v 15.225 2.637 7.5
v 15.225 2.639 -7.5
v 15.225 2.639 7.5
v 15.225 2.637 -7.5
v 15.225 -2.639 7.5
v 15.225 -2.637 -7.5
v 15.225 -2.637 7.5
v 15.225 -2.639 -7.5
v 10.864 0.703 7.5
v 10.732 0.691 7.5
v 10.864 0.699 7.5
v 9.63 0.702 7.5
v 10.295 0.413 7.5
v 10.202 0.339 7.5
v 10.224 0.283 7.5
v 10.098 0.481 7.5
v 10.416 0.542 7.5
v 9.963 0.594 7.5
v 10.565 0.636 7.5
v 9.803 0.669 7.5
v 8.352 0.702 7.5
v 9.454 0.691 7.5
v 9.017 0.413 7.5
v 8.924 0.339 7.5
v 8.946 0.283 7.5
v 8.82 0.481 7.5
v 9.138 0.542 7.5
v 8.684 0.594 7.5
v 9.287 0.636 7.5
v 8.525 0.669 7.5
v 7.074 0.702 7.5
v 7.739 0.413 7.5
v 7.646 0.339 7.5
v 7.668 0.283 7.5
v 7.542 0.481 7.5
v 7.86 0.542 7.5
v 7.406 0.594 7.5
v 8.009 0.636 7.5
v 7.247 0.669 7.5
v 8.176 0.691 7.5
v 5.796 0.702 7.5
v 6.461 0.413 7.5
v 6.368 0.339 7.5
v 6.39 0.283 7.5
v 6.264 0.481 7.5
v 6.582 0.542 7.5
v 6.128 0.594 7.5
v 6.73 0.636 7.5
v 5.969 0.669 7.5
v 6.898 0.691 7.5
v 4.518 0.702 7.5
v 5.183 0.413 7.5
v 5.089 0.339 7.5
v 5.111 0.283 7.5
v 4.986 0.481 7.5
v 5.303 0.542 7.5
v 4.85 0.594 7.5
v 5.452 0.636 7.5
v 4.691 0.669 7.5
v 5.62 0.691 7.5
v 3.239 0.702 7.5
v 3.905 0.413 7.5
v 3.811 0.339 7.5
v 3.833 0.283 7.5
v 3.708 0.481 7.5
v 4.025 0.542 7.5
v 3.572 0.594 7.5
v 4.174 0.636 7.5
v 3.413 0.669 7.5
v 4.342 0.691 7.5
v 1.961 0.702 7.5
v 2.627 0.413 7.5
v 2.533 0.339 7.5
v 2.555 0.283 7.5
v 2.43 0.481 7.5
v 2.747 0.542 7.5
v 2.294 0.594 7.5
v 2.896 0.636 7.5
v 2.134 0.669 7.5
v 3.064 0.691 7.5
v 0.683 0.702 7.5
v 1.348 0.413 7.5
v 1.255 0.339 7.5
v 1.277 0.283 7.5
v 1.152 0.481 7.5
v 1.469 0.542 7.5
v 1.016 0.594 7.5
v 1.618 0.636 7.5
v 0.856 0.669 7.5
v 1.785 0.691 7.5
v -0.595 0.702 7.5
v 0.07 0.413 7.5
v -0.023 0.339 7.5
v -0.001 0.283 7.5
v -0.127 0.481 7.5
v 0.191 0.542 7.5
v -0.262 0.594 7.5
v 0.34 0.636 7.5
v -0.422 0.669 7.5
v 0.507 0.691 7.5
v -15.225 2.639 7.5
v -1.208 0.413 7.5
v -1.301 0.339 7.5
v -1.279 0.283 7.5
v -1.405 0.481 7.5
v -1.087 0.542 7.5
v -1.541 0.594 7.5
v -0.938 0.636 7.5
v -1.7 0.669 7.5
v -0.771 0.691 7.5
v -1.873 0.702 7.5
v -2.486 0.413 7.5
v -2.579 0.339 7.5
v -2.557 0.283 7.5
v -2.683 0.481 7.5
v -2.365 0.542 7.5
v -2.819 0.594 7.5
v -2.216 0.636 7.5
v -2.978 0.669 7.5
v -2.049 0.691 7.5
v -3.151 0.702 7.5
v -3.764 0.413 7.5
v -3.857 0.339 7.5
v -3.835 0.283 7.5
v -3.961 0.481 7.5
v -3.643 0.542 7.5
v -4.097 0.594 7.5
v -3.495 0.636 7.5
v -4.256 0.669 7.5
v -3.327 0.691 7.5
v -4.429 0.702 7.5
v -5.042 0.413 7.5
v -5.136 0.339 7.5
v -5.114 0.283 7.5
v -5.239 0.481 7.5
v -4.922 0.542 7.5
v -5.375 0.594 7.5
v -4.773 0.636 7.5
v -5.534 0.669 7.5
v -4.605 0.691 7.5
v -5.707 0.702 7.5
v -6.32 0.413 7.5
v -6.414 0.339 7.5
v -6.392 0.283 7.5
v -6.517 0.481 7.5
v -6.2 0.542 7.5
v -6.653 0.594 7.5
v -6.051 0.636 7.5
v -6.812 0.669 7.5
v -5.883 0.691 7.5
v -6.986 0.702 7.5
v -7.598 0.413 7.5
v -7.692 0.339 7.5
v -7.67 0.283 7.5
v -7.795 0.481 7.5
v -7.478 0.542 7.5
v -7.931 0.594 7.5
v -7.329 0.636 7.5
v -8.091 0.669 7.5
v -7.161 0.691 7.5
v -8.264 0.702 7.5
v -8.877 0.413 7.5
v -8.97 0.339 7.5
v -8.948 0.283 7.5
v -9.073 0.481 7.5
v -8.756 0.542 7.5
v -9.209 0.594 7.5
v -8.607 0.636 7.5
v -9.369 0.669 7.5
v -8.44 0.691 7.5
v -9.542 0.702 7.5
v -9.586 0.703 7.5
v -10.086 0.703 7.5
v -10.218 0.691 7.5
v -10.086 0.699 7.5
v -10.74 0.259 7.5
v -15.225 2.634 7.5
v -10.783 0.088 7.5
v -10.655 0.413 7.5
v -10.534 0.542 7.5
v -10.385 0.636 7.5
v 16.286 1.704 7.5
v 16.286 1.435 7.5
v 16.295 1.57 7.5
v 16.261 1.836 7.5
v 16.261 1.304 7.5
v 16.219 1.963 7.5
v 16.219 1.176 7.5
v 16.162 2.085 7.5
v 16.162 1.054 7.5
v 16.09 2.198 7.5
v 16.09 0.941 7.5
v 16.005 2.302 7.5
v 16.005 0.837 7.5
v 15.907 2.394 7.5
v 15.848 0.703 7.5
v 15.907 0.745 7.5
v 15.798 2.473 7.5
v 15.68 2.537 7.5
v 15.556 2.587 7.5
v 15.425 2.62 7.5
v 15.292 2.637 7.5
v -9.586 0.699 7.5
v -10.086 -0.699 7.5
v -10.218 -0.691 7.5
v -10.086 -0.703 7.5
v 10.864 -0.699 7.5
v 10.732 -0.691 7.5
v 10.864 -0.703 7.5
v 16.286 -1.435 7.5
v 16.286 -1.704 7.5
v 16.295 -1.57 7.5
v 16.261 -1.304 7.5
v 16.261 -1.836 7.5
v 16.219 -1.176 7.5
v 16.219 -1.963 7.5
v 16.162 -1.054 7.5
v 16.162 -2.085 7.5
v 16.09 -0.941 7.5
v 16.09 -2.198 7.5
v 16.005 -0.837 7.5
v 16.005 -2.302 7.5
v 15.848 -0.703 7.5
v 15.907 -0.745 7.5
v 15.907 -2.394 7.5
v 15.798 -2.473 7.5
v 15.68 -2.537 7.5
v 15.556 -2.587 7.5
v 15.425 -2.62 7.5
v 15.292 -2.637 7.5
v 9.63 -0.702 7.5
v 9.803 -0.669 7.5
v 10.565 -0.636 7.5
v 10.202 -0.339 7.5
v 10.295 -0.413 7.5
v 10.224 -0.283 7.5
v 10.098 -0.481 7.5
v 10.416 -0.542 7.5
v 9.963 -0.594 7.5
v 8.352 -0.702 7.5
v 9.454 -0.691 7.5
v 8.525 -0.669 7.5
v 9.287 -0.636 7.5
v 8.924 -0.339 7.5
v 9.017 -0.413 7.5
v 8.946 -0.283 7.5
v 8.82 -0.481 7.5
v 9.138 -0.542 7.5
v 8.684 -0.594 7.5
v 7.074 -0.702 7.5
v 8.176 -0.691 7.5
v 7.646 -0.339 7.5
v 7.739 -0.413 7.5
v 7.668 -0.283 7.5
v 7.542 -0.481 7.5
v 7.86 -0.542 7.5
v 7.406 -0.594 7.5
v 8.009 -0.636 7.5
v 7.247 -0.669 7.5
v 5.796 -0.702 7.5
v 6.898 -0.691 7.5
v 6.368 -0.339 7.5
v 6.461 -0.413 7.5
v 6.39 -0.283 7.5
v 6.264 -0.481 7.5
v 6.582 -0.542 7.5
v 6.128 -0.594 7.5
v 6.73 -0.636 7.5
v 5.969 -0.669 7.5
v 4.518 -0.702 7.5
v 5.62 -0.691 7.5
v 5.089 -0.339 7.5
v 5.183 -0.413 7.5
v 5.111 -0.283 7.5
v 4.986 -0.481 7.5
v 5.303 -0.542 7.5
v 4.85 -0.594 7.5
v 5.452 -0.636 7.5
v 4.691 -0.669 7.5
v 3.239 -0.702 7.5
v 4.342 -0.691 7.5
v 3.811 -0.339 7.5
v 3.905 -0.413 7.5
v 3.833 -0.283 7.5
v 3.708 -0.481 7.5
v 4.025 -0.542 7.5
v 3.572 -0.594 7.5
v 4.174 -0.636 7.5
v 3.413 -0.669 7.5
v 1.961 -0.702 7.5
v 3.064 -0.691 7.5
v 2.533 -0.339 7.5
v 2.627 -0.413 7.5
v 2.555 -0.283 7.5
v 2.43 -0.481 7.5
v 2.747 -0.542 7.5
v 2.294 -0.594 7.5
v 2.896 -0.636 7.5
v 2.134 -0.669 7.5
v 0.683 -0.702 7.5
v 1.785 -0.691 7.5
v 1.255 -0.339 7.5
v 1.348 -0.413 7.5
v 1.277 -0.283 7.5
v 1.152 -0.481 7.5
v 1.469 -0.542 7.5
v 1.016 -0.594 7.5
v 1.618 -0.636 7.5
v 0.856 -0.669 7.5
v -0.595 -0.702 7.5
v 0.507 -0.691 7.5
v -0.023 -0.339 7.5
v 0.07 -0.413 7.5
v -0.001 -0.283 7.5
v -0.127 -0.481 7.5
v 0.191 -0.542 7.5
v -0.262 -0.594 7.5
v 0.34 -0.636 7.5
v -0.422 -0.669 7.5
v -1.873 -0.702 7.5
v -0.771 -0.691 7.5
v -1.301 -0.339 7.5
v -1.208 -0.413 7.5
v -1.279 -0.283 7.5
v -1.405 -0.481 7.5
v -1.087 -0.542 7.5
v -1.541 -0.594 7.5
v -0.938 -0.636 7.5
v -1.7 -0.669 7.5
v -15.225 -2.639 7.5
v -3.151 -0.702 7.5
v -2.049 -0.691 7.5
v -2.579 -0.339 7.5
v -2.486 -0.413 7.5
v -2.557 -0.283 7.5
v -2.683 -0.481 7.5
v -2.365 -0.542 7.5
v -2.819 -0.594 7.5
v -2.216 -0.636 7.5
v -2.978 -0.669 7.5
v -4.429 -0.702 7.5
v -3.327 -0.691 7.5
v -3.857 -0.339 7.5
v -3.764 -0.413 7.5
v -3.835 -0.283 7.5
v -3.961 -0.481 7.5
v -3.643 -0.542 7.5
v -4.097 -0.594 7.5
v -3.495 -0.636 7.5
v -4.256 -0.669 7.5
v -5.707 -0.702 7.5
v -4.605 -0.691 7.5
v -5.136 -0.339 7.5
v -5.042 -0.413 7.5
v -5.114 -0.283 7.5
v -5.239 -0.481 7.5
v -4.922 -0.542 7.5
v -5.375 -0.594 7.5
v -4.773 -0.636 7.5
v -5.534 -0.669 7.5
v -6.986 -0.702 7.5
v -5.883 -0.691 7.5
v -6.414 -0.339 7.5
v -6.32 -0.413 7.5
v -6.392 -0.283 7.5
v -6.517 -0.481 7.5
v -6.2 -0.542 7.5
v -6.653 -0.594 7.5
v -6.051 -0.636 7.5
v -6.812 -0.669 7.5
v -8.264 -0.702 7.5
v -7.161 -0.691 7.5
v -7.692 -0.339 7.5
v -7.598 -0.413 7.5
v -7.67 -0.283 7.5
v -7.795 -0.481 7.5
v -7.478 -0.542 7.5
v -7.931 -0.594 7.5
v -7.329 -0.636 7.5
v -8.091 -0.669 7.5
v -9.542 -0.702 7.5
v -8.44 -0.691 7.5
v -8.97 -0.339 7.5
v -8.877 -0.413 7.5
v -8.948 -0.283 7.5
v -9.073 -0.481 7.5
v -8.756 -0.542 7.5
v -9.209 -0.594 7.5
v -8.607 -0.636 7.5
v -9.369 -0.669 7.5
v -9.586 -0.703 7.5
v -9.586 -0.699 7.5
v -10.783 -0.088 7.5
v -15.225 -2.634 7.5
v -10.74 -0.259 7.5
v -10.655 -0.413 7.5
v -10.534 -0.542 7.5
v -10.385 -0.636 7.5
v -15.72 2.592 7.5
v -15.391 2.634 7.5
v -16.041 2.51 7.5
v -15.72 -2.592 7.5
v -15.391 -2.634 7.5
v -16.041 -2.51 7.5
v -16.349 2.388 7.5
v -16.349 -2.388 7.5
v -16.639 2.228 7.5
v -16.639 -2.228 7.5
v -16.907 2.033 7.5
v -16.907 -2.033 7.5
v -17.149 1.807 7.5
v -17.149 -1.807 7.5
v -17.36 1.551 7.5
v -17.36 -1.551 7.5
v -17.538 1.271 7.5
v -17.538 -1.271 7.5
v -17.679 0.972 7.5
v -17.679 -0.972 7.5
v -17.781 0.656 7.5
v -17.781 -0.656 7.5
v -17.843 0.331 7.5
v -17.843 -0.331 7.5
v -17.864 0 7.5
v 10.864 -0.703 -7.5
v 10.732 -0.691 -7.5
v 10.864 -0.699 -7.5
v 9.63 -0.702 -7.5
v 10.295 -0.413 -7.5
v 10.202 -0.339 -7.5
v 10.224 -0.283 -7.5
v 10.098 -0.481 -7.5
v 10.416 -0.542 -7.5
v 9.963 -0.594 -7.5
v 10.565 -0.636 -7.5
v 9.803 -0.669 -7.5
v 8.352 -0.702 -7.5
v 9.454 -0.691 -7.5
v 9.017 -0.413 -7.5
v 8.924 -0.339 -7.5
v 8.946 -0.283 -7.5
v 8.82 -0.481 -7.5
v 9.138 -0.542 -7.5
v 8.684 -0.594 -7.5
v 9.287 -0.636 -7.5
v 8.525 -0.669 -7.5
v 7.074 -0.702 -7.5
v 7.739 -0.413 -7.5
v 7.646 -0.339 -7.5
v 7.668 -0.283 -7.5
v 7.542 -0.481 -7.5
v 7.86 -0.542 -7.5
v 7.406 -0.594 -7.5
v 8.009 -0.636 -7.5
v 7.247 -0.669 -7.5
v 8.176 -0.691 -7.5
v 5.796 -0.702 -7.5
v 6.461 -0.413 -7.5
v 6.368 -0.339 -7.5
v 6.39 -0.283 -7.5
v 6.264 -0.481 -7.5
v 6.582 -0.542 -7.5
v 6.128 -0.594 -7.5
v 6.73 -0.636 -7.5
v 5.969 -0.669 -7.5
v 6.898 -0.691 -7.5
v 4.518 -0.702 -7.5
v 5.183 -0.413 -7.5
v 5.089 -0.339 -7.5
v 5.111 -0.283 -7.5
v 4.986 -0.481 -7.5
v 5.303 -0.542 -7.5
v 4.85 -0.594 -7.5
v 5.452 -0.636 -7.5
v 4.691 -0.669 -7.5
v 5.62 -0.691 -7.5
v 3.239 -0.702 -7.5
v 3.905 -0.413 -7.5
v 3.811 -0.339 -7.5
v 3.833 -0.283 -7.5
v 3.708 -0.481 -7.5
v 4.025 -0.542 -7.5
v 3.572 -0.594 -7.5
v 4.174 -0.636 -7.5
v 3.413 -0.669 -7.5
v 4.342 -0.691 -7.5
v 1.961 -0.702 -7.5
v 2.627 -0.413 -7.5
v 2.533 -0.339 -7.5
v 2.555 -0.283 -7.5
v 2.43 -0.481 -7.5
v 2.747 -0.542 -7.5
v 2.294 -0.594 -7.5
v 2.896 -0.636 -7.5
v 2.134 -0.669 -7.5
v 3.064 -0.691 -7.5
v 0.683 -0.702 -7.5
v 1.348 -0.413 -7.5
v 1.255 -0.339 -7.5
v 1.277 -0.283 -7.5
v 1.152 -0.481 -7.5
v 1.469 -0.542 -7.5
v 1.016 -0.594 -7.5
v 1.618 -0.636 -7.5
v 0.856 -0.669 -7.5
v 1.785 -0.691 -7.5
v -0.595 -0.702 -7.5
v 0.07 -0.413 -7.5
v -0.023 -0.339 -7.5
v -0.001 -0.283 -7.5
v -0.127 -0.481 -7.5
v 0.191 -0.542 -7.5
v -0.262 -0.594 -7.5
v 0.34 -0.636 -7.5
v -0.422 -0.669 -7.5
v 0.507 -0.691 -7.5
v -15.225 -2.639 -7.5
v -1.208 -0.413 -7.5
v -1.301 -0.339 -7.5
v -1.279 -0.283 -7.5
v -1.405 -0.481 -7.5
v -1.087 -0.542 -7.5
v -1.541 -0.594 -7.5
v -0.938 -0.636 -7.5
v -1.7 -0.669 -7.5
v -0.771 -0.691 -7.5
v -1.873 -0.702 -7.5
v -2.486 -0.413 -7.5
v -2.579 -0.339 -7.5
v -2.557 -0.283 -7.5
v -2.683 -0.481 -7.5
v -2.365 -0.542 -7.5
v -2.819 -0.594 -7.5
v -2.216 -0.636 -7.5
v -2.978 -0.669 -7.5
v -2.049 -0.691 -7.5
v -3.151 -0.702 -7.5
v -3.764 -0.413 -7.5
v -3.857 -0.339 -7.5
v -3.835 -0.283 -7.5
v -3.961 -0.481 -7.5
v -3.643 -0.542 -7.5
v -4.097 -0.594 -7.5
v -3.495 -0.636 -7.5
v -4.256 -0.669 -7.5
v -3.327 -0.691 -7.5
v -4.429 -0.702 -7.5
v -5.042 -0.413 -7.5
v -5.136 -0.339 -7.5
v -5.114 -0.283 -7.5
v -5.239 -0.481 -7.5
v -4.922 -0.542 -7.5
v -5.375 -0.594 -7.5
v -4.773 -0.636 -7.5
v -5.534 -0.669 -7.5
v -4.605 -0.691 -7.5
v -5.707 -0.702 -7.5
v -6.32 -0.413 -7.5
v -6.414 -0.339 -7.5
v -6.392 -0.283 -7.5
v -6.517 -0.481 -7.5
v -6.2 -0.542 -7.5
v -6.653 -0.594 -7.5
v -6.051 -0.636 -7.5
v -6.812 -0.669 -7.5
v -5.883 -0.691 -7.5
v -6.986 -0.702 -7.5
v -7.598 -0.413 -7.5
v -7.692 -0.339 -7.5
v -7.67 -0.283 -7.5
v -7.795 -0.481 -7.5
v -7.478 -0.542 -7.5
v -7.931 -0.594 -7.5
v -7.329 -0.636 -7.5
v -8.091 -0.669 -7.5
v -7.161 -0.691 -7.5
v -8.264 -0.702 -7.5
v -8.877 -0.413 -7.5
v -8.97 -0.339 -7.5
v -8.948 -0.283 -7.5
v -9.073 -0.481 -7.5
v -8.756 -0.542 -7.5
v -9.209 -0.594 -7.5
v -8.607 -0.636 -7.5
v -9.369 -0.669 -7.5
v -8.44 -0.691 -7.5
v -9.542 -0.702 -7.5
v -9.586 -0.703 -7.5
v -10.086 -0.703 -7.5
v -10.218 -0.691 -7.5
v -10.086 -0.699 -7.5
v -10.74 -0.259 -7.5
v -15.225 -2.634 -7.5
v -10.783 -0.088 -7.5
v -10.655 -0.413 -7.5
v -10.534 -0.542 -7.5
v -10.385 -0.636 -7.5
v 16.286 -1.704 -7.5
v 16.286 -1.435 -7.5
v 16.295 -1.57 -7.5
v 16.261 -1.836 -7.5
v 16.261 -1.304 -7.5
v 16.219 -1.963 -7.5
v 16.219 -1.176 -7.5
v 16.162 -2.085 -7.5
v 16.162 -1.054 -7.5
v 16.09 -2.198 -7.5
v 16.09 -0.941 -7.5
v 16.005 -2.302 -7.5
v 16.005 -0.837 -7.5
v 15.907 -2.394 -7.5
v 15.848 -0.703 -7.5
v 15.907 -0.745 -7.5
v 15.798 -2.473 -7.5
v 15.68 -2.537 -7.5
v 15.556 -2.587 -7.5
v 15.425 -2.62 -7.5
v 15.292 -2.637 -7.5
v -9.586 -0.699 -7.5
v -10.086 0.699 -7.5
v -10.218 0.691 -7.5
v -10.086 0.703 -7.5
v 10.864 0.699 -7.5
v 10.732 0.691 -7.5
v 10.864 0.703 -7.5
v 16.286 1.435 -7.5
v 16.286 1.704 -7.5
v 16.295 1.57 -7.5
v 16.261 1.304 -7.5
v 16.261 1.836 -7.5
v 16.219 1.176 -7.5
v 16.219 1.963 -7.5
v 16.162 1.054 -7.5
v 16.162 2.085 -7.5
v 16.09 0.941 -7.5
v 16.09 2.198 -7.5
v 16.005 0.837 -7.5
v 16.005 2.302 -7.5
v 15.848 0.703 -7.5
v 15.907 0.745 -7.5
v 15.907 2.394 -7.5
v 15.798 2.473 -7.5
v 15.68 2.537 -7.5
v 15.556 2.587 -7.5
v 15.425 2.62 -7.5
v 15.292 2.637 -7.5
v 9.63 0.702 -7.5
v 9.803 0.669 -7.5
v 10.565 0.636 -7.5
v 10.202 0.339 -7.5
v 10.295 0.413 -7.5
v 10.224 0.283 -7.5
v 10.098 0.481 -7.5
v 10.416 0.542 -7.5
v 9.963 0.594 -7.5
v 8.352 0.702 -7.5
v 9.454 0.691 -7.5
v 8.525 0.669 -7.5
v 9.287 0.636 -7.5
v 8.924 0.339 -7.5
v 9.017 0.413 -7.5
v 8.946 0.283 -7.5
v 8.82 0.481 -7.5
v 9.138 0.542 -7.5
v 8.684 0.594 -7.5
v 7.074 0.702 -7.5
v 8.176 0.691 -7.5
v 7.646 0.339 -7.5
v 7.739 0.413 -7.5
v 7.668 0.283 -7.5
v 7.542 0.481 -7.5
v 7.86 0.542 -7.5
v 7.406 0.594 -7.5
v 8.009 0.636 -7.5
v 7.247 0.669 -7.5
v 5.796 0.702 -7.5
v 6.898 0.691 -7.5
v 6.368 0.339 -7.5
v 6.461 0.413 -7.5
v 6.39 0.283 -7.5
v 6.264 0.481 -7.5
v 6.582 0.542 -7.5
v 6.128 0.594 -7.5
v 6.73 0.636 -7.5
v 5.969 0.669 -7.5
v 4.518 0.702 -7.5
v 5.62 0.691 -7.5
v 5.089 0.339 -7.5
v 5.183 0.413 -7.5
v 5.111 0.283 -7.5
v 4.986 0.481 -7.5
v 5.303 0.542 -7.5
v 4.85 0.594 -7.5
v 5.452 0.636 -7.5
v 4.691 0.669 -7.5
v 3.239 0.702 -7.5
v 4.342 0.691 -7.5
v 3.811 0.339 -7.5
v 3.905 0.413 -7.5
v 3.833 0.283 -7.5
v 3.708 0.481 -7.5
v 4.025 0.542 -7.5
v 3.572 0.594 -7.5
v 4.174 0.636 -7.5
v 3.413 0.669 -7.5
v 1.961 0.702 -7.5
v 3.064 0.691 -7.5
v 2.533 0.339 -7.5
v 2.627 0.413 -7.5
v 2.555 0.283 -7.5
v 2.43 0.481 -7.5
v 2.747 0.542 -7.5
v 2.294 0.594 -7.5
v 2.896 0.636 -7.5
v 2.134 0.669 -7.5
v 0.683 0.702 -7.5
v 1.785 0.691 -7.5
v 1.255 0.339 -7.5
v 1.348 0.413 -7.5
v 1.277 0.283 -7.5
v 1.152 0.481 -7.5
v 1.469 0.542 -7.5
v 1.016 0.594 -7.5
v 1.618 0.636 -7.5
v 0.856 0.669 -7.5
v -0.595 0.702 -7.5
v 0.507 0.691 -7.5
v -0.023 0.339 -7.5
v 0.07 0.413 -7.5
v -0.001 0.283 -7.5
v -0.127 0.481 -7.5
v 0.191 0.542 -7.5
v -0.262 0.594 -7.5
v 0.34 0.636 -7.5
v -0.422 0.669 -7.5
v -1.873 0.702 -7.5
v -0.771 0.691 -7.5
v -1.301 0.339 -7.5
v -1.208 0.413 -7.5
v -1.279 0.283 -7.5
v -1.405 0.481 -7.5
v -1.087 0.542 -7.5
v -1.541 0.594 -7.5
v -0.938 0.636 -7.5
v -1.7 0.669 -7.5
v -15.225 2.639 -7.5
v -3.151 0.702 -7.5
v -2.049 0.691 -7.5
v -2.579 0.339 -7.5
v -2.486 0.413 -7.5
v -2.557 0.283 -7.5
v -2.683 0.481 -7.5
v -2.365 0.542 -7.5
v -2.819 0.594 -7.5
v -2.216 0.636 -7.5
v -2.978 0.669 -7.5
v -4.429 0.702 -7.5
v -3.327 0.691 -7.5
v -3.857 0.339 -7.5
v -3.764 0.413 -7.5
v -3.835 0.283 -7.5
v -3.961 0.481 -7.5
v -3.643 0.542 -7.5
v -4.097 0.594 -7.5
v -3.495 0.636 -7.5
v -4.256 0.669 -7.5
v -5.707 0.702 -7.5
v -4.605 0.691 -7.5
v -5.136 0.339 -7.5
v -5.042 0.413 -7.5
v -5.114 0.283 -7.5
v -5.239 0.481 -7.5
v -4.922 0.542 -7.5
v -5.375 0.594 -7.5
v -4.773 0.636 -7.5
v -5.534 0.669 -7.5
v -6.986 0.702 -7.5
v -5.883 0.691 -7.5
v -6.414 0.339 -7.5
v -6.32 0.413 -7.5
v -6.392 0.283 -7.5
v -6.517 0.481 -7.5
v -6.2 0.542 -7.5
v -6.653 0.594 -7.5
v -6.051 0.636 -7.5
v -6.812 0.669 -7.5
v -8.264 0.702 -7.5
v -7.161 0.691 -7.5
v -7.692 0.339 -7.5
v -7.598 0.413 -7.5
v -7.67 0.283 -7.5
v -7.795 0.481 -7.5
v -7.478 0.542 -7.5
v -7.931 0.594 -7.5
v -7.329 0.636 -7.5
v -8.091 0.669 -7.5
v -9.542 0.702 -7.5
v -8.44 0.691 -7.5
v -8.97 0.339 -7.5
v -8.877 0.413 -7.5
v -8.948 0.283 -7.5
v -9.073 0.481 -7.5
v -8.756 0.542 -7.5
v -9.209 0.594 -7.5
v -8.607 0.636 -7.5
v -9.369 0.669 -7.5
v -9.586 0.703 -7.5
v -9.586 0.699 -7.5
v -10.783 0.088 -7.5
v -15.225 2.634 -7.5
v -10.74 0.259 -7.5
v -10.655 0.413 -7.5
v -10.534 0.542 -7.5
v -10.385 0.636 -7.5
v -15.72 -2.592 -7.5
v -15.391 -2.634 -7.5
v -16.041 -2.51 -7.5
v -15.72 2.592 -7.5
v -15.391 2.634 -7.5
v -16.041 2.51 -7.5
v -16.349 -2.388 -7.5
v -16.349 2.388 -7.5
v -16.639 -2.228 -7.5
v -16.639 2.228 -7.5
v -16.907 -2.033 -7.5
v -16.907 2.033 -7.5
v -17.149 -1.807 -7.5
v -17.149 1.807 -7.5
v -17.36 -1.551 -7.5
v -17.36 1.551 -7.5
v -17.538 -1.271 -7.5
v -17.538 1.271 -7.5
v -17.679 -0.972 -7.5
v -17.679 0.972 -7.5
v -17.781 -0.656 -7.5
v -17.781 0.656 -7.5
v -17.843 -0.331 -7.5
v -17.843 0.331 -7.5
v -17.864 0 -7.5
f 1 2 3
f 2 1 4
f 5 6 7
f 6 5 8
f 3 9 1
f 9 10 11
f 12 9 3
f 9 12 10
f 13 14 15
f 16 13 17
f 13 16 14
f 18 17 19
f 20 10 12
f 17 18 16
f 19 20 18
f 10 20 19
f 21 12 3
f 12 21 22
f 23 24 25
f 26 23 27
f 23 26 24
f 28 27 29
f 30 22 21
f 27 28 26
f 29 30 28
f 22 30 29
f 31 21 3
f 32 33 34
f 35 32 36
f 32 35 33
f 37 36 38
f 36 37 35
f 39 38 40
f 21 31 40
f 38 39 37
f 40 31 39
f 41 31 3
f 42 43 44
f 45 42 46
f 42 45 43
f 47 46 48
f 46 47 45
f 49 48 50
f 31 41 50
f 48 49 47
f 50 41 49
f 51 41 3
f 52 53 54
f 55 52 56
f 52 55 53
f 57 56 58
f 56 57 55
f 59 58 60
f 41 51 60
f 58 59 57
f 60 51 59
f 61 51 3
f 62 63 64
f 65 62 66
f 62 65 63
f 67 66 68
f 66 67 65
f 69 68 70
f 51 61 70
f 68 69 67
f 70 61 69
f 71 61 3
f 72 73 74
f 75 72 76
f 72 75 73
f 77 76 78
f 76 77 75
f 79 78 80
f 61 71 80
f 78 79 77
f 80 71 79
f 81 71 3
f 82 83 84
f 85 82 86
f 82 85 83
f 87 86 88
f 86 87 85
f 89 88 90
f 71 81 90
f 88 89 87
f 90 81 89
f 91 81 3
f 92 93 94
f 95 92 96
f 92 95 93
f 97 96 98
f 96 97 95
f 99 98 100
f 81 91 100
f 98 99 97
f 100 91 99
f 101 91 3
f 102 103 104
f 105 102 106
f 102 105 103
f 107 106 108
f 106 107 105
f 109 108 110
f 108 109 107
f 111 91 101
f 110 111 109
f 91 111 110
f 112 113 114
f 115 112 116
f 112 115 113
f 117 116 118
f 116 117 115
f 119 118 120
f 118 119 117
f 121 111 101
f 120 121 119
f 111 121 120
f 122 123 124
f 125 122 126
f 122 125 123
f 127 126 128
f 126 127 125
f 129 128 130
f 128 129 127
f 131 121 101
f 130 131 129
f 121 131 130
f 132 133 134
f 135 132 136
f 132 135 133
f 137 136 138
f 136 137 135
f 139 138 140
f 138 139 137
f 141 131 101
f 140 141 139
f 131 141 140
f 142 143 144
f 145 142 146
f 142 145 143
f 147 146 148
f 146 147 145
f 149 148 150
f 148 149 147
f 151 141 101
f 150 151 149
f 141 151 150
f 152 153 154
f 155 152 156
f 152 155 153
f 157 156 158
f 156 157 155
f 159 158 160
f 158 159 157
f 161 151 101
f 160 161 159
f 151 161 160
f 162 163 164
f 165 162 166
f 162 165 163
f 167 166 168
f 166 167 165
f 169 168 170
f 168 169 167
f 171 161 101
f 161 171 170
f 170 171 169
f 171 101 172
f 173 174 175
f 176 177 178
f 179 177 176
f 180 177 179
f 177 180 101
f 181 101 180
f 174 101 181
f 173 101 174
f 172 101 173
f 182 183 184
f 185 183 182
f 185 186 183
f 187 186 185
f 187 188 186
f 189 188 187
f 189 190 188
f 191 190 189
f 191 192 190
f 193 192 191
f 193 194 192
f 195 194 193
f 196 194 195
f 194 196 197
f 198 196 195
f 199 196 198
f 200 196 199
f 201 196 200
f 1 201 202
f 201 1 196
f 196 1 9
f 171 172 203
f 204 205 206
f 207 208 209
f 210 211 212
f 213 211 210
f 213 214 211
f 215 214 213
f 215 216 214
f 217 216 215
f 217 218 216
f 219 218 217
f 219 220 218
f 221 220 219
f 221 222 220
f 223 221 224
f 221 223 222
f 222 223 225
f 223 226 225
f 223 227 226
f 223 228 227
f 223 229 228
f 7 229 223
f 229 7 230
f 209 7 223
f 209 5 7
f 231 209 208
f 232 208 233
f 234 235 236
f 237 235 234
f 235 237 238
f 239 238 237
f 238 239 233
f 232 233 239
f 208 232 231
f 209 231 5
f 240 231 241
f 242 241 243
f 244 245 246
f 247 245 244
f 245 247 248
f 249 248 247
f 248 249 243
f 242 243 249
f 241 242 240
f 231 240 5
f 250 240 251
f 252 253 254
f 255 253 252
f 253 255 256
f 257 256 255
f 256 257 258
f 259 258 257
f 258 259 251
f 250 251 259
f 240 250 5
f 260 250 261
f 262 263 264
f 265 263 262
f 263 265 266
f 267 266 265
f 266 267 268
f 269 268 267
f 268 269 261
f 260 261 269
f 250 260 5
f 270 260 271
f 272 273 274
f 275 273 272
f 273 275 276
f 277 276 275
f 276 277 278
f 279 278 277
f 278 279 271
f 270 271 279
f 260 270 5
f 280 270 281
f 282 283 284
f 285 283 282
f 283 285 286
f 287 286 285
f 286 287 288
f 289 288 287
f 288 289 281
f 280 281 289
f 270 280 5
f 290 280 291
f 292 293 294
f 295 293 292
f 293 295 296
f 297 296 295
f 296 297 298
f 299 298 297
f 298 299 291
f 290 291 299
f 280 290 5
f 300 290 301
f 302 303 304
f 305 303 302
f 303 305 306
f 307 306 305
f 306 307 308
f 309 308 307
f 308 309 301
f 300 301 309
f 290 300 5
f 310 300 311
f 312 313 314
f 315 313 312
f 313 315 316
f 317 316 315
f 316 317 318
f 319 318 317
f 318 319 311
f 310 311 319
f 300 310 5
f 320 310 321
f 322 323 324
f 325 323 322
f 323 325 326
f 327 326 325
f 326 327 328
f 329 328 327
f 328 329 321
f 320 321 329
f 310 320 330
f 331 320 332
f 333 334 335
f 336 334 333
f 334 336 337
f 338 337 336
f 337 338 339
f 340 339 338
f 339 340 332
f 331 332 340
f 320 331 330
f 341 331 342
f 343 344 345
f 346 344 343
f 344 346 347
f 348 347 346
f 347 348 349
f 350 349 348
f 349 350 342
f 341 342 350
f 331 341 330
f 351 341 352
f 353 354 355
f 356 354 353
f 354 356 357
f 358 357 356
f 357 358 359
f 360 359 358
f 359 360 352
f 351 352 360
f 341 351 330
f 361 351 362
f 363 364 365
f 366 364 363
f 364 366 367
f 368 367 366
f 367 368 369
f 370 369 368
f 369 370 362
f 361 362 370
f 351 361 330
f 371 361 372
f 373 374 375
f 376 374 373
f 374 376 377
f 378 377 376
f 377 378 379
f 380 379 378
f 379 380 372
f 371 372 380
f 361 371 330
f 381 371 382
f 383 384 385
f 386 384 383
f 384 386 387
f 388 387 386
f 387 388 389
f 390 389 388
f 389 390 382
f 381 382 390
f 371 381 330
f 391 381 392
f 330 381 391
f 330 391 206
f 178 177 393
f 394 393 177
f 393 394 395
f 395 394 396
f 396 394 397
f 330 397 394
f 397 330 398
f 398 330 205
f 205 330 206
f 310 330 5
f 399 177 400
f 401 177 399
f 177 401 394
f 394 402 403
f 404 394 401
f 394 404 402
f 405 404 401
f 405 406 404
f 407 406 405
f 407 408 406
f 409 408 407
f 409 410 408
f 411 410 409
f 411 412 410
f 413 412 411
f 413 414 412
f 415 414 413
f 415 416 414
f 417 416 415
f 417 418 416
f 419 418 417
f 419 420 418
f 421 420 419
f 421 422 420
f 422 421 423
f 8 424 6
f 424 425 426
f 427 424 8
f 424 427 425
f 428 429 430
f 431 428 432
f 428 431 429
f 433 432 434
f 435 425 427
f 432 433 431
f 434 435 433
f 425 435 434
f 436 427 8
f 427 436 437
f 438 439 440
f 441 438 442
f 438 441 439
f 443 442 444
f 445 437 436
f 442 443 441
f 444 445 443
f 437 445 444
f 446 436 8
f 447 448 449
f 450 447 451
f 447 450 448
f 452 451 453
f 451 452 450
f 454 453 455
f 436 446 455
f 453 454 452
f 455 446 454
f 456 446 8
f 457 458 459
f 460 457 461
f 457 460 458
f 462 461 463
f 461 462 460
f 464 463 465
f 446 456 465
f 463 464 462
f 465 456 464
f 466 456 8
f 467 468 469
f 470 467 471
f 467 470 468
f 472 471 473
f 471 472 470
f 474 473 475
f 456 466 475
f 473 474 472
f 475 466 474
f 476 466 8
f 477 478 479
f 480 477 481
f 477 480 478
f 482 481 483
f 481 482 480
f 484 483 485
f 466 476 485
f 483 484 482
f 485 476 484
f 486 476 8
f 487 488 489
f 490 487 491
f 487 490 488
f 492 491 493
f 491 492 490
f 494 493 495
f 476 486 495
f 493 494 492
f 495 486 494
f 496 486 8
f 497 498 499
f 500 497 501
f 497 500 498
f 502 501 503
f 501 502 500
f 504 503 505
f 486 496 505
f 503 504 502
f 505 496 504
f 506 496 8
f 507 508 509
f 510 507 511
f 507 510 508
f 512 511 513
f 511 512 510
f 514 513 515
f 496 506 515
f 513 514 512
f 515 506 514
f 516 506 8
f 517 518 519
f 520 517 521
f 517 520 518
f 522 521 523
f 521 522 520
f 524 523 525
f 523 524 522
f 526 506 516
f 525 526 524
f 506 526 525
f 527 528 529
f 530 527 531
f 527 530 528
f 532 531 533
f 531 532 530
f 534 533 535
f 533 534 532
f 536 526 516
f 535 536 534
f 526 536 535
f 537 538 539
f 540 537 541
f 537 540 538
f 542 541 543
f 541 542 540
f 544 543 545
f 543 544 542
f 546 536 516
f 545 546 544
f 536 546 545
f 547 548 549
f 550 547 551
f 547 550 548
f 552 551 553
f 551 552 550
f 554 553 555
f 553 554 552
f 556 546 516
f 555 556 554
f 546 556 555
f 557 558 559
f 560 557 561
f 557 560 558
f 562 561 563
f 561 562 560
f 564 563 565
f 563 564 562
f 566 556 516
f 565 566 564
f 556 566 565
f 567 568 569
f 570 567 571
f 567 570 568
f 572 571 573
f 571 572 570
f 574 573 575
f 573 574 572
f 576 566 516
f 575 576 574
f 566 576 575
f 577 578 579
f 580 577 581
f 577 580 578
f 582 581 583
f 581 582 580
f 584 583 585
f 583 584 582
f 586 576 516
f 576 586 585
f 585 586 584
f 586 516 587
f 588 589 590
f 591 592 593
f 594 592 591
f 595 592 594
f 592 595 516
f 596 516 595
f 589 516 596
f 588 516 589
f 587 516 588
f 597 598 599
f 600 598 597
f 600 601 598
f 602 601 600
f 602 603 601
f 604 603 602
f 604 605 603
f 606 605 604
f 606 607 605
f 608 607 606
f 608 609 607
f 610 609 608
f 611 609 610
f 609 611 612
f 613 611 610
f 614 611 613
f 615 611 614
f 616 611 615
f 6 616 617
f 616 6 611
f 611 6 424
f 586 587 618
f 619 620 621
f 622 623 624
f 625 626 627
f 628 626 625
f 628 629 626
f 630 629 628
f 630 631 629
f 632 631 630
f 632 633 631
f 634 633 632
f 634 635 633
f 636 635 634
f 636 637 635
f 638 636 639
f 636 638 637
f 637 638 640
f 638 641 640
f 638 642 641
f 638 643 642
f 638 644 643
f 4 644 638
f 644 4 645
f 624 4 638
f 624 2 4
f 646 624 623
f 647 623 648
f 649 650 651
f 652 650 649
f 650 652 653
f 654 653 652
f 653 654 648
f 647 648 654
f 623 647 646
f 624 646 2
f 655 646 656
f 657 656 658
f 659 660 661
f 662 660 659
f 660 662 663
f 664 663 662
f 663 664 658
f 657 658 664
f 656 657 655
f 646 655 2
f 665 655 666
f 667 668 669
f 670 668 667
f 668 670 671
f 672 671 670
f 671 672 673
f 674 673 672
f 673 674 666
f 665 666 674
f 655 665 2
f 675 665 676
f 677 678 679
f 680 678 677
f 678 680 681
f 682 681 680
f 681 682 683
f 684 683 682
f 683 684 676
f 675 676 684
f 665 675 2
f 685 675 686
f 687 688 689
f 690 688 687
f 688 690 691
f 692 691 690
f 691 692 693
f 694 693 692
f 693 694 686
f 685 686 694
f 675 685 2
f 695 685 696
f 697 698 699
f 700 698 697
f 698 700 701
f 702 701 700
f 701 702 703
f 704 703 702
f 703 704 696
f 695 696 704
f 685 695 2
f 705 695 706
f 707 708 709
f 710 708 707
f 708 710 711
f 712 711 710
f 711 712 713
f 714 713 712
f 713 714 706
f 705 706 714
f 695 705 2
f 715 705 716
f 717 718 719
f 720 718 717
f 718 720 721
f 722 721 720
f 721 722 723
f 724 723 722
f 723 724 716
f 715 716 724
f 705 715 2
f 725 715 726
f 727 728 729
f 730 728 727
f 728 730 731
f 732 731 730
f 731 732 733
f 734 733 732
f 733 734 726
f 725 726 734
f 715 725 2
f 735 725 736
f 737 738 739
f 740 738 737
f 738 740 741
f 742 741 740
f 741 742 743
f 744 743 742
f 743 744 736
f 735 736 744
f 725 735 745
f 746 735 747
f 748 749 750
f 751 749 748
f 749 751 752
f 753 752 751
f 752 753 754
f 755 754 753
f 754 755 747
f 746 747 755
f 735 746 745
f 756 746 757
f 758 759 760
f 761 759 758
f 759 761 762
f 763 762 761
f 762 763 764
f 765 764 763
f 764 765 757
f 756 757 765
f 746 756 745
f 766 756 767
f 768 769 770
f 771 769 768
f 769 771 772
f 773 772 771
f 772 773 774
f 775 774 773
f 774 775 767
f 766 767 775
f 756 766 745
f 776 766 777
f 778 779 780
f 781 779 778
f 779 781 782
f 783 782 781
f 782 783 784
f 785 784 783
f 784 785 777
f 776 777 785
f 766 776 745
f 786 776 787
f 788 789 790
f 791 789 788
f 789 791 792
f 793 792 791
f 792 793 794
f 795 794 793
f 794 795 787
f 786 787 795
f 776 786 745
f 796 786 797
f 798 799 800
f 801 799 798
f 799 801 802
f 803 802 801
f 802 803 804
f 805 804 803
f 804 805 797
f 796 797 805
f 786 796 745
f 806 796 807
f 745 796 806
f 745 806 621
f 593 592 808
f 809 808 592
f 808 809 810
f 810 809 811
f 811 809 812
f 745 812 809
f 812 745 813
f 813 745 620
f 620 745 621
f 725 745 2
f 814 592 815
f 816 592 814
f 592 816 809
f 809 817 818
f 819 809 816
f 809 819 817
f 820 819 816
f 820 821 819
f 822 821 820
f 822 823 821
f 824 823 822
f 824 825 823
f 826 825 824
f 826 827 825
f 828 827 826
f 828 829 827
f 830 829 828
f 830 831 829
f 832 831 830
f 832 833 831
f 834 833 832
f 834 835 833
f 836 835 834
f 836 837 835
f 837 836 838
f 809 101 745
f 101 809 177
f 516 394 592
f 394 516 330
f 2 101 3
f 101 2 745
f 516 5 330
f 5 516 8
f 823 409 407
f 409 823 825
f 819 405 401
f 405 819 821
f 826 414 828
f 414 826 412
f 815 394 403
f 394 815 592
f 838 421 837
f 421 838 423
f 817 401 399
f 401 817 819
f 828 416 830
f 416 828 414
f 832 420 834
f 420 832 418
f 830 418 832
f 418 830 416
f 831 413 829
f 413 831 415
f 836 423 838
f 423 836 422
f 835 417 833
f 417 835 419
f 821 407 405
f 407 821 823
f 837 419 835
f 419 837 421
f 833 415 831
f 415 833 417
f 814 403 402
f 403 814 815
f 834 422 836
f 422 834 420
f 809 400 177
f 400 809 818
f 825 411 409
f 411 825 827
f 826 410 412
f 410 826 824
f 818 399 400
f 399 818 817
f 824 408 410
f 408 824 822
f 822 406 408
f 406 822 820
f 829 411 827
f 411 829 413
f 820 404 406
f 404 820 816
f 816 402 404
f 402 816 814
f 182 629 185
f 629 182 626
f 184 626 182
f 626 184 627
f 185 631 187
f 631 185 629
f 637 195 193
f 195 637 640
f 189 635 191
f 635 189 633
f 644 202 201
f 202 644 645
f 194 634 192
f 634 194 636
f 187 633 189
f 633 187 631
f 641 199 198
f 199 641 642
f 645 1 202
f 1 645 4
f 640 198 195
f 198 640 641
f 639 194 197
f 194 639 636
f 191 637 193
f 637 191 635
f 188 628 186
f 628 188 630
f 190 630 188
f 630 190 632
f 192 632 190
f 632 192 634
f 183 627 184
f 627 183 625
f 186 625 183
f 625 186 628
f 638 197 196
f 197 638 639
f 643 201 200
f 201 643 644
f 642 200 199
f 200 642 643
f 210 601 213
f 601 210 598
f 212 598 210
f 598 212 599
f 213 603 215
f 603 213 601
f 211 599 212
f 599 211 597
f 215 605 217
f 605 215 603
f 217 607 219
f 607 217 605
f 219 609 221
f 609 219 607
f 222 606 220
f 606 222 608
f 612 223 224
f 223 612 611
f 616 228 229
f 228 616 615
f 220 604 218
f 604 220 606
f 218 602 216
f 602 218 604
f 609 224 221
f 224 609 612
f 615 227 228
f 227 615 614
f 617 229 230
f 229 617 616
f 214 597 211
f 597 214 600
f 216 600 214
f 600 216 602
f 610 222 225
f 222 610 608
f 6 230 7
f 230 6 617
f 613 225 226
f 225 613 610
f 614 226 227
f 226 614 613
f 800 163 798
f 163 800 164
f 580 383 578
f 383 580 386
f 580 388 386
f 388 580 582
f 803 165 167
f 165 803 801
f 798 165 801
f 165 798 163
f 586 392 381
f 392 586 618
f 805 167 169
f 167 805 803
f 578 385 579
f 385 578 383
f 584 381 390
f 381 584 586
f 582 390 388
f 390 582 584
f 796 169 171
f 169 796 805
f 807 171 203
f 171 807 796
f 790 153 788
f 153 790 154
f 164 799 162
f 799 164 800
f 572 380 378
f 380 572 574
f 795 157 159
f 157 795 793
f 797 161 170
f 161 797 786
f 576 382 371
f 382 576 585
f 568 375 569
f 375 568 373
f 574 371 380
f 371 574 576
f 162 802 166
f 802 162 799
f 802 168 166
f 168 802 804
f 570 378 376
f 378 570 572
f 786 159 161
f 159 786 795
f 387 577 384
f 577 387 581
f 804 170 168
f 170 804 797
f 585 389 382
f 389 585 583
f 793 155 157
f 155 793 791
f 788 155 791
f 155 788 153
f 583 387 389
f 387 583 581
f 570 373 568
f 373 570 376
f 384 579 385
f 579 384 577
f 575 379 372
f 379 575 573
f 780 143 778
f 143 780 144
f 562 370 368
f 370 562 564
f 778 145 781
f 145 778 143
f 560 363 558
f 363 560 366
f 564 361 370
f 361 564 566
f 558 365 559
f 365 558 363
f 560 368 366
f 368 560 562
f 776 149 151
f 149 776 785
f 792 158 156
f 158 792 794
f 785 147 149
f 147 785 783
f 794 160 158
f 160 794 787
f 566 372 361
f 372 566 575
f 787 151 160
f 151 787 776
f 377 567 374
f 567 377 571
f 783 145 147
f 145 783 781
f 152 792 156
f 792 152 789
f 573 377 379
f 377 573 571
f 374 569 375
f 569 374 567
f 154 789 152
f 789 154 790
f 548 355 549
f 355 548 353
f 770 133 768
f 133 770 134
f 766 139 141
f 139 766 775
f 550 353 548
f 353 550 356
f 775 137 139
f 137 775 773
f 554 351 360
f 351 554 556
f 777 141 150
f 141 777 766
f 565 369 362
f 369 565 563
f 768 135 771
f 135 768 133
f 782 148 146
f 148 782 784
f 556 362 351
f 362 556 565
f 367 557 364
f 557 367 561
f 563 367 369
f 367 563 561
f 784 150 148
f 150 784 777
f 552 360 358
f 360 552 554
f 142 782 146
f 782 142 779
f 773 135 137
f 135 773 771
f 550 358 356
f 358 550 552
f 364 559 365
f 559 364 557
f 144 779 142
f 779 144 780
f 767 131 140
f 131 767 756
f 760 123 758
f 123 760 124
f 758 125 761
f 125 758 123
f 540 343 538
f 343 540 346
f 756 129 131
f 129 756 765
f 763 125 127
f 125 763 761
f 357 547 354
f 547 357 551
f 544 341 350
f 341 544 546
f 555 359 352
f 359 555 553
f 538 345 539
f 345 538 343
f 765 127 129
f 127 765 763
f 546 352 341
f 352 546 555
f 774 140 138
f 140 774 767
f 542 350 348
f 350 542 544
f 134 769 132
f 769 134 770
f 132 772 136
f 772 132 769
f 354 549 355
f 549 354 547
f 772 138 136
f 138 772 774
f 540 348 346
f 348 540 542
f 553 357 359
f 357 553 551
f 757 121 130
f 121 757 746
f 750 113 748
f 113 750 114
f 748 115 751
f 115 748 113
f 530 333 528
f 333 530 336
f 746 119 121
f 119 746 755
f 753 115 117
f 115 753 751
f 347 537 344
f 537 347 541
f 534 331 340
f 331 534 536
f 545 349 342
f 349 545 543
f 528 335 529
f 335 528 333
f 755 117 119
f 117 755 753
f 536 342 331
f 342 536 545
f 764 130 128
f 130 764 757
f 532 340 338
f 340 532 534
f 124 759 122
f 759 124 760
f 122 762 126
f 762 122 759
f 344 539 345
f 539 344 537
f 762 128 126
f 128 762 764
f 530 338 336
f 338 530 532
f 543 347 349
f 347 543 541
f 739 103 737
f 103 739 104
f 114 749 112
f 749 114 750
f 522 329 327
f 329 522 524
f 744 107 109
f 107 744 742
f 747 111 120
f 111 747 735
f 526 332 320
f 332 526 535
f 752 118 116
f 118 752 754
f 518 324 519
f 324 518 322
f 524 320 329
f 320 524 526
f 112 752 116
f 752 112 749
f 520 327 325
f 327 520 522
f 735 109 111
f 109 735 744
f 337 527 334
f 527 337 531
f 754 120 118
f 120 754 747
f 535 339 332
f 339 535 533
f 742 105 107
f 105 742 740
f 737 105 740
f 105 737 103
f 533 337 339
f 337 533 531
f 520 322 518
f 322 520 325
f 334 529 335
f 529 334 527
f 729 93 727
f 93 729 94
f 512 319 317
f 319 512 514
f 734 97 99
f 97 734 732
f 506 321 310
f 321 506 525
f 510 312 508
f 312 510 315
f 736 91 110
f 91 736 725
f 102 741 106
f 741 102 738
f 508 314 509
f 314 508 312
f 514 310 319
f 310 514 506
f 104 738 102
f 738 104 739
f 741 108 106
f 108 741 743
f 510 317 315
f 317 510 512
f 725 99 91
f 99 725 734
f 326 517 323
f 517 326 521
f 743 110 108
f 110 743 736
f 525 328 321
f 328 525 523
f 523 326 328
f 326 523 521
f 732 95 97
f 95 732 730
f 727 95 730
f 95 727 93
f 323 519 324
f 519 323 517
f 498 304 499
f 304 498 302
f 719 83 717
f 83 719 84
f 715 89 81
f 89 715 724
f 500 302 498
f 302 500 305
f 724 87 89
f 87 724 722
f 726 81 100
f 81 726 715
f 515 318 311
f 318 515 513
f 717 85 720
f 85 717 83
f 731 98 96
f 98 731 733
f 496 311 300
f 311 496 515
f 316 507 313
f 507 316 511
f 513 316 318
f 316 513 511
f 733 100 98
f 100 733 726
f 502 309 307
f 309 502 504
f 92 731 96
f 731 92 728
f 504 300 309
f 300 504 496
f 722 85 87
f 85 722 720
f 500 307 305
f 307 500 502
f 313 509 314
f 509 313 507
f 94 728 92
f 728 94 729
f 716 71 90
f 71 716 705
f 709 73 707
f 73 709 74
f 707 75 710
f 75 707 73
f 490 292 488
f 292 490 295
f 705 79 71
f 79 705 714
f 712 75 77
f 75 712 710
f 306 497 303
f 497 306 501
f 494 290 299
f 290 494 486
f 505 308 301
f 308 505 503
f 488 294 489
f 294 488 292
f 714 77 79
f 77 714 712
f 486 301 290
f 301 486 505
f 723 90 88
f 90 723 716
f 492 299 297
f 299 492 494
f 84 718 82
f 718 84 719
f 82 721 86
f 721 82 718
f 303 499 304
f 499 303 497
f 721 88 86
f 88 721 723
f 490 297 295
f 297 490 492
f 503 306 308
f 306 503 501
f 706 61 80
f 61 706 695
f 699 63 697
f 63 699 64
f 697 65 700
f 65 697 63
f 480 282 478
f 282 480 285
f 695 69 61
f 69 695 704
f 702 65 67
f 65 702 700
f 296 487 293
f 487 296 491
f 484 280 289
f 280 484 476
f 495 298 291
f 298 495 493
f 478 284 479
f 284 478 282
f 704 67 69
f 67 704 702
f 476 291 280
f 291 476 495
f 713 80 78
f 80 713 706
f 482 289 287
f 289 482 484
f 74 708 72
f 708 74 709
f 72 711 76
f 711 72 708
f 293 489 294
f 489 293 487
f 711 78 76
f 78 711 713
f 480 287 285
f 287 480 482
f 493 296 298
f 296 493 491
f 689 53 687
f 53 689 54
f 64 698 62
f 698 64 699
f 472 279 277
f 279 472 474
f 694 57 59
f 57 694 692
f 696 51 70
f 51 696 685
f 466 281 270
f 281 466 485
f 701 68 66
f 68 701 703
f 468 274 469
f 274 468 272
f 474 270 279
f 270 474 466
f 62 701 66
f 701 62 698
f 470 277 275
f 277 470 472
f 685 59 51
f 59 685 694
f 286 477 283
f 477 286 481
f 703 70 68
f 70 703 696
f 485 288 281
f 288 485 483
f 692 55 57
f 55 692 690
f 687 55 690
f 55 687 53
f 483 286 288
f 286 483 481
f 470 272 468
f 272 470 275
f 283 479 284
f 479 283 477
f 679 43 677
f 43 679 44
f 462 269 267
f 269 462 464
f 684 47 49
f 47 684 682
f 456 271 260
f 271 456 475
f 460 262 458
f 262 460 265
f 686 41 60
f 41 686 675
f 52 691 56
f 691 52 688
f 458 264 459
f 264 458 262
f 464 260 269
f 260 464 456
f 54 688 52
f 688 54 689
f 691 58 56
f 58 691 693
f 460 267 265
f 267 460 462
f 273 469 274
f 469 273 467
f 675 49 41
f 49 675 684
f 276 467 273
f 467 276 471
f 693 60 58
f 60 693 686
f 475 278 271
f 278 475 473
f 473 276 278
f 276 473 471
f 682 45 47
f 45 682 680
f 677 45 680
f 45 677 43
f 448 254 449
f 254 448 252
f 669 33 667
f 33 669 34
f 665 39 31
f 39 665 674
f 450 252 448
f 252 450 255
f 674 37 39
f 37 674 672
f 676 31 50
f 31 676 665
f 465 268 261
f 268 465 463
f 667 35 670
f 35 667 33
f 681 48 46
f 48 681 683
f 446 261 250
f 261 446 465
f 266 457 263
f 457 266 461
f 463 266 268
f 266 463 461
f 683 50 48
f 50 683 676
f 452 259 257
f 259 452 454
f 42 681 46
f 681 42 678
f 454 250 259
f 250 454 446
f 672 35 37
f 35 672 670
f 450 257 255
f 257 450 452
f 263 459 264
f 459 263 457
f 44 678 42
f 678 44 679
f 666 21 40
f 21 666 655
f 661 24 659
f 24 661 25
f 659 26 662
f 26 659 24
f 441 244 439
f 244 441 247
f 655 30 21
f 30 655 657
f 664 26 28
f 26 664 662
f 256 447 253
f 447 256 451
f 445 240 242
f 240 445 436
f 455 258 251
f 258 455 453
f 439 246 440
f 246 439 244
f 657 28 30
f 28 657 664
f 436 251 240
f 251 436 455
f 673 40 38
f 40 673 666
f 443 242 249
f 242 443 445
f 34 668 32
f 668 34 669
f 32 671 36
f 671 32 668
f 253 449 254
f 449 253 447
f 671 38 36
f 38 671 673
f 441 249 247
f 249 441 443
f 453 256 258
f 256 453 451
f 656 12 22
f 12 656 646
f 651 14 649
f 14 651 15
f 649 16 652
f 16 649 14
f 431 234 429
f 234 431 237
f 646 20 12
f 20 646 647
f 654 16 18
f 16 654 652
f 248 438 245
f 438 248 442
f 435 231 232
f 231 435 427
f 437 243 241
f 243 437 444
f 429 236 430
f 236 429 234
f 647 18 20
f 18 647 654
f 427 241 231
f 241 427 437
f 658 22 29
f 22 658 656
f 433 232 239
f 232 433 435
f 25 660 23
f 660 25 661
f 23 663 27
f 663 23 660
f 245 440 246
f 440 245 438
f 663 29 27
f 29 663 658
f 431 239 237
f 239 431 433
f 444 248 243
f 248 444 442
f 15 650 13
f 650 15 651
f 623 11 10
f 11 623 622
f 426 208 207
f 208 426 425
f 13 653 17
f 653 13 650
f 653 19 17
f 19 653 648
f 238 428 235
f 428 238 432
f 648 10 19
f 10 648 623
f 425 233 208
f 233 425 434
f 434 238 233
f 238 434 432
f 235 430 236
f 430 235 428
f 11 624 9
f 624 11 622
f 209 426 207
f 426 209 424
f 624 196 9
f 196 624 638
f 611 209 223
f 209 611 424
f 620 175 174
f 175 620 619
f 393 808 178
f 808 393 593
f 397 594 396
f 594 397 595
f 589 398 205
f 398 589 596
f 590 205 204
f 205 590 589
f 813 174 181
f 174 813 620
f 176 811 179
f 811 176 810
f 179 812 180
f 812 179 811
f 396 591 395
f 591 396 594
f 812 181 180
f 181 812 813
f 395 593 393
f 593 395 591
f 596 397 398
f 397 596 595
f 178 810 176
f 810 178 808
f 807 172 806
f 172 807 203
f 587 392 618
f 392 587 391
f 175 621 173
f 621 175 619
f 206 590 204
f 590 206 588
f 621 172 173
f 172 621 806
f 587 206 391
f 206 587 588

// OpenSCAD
//CUSTOMIZER VARIABLES

// Number of wires of the ribbon cable
wire_count = 16; //  [0:100]

// Width of the ribbon cable
wire_width = 20.45; //  [0:200]

// Depth of the clip
clip_depth = 15; //  [0:30]

// With of the clip (over wires)
clip_w = 10; //  [0:30]

//CUSTOMIZER VARIABLES END

module ribbonCableClip(wireCount, cableWidth, depth)
{
  wireDiameter = cableWidth / wireCount;
  
  difference()
  {
    union()
    {
      cube([cableWidth+clip_w, wireDiameter+4, depth], center=true);
      translate([(-cableWidth)/2-clip_w/2,0,0])
        cylinder(d=wireDiameter+4, h=depth, center=true, $fn=50);
      translate([(cableWidth)/2+clip_w/2,(wireDiameter+5)/4,0])
        cylinder(d=(wireDiameter+3)/2, h=depth, center=true, $fn=50);
      translate([(cableWidth)/2+clip_w/2,-(wireDiameter+5)/4,0])
        cylinder(d=(wireDiameter+3)/2, h=depth, center=true, $fn=50);
   
    }
    translate([(wireDiameter-cableWidth)/2+wireCount*wireDiameter,0,0])
      cylinder(d=wireDiameter*1.1, h=depth+2, center=true, $fn=25);
    translate([(wireDiameter-cableWidth)/2+wireCount*wireDiameter,-wireDiameter*0.55, -depth/2])
      cube([clip_w/2, wireDiameter*1.1, depth], center=false);
    for(i=[0:1:wireCount-1])
    {
      translate([(wireDiameter-cableWidth)/2+i*wireDiameter,0,0])
        cylinder(d=wireDiameter*1.1, h=depth+2, center=true, $fn=25);
    }
    translate([(wireDiameter-cableWidth)/2-0.5,0,0]) 
      cylinder(d=wireDiameter*1.1, h=depth+2, center=true, $fn=25);
    translate([(wireDiameter-cableWidth)/2-0.5,-wireDiameter*0.55, -depth/2])
      cube([0.5, wireDiameter*1.1, depth], center=false);
  }
}

// Ribbon cable with 18 wires a width of 22.7mm and 10mm(2x5mm) +width
//ribbonCableClip(18, 22.7, 10, 10);

ribbonCableClip(wire_count, wire_width, clip_depth);
